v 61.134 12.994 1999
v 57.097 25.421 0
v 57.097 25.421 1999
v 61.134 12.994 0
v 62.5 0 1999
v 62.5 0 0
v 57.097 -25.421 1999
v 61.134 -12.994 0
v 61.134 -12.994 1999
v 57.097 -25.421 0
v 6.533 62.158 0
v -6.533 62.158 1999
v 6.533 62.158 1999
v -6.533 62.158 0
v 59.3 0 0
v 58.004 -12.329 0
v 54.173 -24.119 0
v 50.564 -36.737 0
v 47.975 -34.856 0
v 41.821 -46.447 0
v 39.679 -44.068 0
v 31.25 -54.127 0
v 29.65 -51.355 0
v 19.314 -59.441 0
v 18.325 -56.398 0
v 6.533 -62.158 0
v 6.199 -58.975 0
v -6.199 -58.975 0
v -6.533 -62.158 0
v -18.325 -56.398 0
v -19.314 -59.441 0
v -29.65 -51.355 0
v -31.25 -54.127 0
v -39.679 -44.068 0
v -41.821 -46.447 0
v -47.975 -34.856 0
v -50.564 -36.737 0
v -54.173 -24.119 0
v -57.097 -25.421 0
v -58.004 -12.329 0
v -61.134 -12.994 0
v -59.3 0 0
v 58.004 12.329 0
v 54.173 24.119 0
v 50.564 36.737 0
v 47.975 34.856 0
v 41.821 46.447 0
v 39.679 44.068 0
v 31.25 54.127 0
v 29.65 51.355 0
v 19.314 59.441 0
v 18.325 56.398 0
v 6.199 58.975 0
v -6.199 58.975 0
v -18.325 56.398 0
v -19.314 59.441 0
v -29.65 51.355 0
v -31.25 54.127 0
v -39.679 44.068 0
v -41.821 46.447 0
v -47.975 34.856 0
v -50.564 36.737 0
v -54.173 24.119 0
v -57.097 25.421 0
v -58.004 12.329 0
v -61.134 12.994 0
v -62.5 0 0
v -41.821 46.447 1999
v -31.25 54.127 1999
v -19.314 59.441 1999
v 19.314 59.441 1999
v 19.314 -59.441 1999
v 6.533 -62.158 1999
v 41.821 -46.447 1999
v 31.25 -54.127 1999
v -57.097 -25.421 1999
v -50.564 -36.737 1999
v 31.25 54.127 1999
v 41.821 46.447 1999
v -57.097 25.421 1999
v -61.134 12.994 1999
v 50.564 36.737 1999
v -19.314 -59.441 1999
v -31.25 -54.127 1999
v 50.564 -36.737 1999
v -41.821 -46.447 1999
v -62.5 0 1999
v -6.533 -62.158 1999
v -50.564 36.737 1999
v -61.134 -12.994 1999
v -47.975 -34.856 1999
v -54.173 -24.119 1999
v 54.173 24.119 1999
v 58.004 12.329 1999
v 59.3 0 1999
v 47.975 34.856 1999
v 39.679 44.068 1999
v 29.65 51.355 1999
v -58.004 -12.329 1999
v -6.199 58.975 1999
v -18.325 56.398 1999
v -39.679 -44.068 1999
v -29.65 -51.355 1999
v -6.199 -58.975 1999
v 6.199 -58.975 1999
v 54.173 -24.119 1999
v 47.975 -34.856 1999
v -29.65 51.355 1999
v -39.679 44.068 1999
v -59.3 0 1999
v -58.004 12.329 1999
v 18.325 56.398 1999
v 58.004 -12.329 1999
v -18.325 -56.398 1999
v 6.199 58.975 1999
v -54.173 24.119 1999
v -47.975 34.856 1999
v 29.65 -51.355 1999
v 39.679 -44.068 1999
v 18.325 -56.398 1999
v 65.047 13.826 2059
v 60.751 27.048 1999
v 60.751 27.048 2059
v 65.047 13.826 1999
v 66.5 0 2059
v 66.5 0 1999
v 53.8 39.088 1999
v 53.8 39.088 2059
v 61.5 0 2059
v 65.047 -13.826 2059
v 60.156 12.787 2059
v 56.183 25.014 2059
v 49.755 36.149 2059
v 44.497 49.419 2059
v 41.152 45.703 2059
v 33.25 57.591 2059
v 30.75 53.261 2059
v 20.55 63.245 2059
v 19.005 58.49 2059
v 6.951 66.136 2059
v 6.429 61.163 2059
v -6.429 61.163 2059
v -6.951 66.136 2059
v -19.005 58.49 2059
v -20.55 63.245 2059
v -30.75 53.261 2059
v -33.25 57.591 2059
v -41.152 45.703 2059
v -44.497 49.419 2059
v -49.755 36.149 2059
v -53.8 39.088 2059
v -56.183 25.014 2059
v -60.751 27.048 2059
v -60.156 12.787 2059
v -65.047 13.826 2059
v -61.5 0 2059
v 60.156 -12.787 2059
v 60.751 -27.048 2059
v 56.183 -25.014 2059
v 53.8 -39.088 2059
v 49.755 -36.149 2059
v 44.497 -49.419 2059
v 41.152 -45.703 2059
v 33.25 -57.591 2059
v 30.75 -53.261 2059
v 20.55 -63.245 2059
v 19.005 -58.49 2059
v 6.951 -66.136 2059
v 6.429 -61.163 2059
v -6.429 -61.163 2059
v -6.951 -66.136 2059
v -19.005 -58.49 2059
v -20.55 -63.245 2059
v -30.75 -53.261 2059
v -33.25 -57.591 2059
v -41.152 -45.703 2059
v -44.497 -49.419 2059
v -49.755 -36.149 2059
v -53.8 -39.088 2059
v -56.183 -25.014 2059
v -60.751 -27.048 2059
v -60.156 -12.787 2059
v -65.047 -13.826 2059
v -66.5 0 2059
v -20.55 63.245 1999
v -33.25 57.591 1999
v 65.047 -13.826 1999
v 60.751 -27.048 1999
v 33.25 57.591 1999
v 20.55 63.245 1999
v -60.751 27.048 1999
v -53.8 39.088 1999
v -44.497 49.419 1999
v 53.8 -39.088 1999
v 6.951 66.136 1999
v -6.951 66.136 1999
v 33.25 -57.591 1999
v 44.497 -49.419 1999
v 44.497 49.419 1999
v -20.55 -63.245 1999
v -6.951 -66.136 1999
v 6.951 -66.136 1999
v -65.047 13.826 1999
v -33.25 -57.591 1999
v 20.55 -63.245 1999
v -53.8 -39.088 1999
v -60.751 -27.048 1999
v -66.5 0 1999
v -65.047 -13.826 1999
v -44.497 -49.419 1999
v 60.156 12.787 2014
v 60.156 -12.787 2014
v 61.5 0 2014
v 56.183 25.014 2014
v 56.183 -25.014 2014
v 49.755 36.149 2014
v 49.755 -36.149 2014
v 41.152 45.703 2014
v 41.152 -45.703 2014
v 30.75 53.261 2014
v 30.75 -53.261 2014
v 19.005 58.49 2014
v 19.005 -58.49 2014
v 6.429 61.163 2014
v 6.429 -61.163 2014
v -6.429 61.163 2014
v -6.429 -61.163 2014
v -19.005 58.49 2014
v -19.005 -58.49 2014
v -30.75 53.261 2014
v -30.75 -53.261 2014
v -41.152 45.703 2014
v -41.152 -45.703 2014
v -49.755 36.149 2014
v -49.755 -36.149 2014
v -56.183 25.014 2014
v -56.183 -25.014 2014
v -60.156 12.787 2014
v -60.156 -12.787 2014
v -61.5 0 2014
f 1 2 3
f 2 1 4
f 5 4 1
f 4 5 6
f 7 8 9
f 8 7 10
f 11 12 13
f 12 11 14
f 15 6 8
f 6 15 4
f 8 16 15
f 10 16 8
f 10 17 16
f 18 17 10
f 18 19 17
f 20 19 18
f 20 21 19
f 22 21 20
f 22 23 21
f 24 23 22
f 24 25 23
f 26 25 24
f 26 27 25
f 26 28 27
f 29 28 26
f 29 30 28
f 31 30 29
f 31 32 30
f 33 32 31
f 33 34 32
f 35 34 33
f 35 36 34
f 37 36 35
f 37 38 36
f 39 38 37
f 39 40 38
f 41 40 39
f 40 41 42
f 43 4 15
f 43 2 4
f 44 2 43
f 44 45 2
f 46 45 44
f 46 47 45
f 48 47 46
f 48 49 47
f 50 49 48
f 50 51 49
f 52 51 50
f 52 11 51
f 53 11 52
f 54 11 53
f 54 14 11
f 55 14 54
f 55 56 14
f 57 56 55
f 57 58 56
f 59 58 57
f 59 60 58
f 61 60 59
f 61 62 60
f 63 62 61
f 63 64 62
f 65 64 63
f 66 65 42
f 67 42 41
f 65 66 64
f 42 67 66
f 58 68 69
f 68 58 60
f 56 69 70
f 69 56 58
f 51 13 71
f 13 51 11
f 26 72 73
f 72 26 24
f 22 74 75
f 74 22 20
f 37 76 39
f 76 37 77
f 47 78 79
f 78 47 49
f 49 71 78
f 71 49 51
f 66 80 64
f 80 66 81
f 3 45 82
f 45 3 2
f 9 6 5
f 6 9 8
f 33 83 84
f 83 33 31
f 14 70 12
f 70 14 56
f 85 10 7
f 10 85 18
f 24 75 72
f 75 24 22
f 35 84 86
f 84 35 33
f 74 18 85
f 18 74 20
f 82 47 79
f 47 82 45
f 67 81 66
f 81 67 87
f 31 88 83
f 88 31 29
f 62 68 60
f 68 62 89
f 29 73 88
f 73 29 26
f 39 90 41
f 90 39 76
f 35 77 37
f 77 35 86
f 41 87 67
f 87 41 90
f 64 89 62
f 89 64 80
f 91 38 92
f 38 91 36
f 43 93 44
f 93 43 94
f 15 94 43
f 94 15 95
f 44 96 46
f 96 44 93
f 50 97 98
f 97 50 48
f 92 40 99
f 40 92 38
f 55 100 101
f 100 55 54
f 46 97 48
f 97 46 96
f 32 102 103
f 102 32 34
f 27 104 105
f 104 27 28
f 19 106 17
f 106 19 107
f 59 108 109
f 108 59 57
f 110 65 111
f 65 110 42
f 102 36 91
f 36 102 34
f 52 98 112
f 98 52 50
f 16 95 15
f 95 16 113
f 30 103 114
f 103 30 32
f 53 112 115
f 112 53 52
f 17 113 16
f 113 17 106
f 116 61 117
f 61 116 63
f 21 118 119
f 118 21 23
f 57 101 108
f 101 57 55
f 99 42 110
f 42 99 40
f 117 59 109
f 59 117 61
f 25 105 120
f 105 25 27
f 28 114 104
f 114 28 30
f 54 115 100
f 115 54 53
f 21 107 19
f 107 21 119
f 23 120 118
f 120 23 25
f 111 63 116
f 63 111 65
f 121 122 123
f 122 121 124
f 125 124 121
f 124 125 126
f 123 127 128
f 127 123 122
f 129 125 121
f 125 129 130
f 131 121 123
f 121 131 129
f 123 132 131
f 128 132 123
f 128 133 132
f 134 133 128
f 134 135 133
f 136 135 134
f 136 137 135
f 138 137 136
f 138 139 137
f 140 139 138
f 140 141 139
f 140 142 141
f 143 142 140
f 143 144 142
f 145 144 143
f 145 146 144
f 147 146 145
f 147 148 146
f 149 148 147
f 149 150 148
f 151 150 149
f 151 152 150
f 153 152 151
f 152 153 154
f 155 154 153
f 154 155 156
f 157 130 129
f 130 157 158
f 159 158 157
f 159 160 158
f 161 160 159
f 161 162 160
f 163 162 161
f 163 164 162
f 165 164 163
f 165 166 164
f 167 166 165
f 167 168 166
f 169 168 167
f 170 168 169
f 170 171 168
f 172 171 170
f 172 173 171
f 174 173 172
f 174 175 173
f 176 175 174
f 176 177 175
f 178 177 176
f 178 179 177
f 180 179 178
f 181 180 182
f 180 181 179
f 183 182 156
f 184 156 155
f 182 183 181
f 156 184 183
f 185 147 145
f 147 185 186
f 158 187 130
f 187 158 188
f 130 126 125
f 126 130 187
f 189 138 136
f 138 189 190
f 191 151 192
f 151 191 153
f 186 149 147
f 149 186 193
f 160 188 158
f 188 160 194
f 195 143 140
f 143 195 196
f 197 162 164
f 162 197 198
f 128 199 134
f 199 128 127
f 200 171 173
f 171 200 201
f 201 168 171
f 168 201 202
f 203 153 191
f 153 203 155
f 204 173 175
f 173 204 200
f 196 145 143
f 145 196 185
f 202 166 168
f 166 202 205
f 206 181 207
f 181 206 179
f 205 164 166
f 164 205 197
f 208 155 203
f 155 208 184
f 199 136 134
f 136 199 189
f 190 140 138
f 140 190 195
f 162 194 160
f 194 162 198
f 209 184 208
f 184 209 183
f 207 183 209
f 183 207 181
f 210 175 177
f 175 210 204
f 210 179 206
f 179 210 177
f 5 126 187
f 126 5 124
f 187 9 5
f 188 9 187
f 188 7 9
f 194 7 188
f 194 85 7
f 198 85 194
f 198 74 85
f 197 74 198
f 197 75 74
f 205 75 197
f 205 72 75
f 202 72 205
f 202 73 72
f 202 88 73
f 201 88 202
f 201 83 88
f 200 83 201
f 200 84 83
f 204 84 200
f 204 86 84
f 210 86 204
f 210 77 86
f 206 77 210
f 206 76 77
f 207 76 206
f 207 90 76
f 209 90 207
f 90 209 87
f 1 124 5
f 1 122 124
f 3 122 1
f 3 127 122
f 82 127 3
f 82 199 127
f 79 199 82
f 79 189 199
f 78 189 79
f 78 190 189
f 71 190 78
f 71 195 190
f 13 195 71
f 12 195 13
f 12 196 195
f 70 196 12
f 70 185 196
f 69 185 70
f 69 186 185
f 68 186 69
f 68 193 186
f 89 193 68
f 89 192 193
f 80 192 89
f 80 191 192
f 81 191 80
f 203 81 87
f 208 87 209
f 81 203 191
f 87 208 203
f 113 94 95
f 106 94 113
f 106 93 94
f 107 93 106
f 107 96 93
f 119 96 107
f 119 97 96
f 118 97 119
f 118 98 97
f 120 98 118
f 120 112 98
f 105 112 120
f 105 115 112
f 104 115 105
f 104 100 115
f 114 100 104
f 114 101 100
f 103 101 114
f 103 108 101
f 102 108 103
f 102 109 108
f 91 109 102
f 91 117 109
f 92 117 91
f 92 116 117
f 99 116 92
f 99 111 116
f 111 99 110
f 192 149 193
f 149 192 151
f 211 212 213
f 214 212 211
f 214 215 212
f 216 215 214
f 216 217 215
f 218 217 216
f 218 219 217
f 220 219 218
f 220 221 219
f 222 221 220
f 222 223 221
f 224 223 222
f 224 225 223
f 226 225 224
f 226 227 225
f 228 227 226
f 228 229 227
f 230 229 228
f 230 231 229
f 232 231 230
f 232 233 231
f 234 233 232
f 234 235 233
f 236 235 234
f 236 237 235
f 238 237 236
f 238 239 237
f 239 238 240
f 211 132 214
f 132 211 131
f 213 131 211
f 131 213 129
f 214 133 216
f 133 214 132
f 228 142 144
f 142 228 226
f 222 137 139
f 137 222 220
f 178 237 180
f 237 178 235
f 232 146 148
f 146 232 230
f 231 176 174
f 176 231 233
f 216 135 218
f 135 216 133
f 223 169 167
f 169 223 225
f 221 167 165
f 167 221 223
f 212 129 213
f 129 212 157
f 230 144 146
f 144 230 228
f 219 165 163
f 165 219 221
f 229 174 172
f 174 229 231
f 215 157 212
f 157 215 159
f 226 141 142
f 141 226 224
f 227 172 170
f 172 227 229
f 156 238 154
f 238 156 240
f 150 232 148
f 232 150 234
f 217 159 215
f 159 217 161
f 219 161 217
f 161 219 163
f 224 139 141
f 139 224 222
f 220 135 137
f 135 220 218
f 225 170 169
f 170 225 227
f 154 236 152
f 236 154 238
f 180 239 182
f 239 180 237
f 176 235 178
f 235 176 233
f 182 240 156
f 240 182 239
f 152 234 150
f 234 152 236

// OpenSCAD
// Parameters
pipe_standard = 1; //[1:1:1]
nominal_size_mm = 125; //[63:250:1]
length_mm = 2000; //[1000:4000:10]
pipe_od_mm = 125; //[63:250:1]
wall_thickness_mm = 3.2; //[1.6:6.4:0.1]
fitting_length_mm = 60; //[30:120:1]
fitting_od_extra_mm = 8; //[4:20:1]
fitting_wall_extra_mm = 1.8; //[0.8:4:0.1]
socket_depth_mm = 45; //[20:90:1]
overlap_mm = 1; //[0.5:2:0.1]

// HT Pipe Segment - Complete Geometry
module ht_pipe() {
  color([0.85, 0.85, 0.8]) { // PVC color
    union() {
      // Pipe segment
      difference() {
        cylinder(h=length_mm, r=pipe_od_mm/2, center=false);
        translate([0, 0, -overlap_mm])
          cylinder(h=length_mm + 2*overlap_mm, r=pipe_od_mm/2 - wall_thickness_mm, center=false);
      }
      // End fitting
      difference() {
        translate([0, 0, length_mm - overlap_mm])
          cylinder(h=fitting_length_mm, r=pipe_od_mm/2 + fitting_od_extra_mm/2, center=false);
        translate([0, 0, length_mm + fitting_length_mm - socket_depth_mm - overlap_mm])
          cylinder(h=socket_depth_mm + overlap_mm, r=pipe_od_mm/2 + fitting_od_extra_mm/2 - (wall_thickness_mm + fitting_wall_extra_mm), center=false);
      }
    }
  }
}

// Assembly
module assembly() {
  ht_pipe();
}

assembly();
